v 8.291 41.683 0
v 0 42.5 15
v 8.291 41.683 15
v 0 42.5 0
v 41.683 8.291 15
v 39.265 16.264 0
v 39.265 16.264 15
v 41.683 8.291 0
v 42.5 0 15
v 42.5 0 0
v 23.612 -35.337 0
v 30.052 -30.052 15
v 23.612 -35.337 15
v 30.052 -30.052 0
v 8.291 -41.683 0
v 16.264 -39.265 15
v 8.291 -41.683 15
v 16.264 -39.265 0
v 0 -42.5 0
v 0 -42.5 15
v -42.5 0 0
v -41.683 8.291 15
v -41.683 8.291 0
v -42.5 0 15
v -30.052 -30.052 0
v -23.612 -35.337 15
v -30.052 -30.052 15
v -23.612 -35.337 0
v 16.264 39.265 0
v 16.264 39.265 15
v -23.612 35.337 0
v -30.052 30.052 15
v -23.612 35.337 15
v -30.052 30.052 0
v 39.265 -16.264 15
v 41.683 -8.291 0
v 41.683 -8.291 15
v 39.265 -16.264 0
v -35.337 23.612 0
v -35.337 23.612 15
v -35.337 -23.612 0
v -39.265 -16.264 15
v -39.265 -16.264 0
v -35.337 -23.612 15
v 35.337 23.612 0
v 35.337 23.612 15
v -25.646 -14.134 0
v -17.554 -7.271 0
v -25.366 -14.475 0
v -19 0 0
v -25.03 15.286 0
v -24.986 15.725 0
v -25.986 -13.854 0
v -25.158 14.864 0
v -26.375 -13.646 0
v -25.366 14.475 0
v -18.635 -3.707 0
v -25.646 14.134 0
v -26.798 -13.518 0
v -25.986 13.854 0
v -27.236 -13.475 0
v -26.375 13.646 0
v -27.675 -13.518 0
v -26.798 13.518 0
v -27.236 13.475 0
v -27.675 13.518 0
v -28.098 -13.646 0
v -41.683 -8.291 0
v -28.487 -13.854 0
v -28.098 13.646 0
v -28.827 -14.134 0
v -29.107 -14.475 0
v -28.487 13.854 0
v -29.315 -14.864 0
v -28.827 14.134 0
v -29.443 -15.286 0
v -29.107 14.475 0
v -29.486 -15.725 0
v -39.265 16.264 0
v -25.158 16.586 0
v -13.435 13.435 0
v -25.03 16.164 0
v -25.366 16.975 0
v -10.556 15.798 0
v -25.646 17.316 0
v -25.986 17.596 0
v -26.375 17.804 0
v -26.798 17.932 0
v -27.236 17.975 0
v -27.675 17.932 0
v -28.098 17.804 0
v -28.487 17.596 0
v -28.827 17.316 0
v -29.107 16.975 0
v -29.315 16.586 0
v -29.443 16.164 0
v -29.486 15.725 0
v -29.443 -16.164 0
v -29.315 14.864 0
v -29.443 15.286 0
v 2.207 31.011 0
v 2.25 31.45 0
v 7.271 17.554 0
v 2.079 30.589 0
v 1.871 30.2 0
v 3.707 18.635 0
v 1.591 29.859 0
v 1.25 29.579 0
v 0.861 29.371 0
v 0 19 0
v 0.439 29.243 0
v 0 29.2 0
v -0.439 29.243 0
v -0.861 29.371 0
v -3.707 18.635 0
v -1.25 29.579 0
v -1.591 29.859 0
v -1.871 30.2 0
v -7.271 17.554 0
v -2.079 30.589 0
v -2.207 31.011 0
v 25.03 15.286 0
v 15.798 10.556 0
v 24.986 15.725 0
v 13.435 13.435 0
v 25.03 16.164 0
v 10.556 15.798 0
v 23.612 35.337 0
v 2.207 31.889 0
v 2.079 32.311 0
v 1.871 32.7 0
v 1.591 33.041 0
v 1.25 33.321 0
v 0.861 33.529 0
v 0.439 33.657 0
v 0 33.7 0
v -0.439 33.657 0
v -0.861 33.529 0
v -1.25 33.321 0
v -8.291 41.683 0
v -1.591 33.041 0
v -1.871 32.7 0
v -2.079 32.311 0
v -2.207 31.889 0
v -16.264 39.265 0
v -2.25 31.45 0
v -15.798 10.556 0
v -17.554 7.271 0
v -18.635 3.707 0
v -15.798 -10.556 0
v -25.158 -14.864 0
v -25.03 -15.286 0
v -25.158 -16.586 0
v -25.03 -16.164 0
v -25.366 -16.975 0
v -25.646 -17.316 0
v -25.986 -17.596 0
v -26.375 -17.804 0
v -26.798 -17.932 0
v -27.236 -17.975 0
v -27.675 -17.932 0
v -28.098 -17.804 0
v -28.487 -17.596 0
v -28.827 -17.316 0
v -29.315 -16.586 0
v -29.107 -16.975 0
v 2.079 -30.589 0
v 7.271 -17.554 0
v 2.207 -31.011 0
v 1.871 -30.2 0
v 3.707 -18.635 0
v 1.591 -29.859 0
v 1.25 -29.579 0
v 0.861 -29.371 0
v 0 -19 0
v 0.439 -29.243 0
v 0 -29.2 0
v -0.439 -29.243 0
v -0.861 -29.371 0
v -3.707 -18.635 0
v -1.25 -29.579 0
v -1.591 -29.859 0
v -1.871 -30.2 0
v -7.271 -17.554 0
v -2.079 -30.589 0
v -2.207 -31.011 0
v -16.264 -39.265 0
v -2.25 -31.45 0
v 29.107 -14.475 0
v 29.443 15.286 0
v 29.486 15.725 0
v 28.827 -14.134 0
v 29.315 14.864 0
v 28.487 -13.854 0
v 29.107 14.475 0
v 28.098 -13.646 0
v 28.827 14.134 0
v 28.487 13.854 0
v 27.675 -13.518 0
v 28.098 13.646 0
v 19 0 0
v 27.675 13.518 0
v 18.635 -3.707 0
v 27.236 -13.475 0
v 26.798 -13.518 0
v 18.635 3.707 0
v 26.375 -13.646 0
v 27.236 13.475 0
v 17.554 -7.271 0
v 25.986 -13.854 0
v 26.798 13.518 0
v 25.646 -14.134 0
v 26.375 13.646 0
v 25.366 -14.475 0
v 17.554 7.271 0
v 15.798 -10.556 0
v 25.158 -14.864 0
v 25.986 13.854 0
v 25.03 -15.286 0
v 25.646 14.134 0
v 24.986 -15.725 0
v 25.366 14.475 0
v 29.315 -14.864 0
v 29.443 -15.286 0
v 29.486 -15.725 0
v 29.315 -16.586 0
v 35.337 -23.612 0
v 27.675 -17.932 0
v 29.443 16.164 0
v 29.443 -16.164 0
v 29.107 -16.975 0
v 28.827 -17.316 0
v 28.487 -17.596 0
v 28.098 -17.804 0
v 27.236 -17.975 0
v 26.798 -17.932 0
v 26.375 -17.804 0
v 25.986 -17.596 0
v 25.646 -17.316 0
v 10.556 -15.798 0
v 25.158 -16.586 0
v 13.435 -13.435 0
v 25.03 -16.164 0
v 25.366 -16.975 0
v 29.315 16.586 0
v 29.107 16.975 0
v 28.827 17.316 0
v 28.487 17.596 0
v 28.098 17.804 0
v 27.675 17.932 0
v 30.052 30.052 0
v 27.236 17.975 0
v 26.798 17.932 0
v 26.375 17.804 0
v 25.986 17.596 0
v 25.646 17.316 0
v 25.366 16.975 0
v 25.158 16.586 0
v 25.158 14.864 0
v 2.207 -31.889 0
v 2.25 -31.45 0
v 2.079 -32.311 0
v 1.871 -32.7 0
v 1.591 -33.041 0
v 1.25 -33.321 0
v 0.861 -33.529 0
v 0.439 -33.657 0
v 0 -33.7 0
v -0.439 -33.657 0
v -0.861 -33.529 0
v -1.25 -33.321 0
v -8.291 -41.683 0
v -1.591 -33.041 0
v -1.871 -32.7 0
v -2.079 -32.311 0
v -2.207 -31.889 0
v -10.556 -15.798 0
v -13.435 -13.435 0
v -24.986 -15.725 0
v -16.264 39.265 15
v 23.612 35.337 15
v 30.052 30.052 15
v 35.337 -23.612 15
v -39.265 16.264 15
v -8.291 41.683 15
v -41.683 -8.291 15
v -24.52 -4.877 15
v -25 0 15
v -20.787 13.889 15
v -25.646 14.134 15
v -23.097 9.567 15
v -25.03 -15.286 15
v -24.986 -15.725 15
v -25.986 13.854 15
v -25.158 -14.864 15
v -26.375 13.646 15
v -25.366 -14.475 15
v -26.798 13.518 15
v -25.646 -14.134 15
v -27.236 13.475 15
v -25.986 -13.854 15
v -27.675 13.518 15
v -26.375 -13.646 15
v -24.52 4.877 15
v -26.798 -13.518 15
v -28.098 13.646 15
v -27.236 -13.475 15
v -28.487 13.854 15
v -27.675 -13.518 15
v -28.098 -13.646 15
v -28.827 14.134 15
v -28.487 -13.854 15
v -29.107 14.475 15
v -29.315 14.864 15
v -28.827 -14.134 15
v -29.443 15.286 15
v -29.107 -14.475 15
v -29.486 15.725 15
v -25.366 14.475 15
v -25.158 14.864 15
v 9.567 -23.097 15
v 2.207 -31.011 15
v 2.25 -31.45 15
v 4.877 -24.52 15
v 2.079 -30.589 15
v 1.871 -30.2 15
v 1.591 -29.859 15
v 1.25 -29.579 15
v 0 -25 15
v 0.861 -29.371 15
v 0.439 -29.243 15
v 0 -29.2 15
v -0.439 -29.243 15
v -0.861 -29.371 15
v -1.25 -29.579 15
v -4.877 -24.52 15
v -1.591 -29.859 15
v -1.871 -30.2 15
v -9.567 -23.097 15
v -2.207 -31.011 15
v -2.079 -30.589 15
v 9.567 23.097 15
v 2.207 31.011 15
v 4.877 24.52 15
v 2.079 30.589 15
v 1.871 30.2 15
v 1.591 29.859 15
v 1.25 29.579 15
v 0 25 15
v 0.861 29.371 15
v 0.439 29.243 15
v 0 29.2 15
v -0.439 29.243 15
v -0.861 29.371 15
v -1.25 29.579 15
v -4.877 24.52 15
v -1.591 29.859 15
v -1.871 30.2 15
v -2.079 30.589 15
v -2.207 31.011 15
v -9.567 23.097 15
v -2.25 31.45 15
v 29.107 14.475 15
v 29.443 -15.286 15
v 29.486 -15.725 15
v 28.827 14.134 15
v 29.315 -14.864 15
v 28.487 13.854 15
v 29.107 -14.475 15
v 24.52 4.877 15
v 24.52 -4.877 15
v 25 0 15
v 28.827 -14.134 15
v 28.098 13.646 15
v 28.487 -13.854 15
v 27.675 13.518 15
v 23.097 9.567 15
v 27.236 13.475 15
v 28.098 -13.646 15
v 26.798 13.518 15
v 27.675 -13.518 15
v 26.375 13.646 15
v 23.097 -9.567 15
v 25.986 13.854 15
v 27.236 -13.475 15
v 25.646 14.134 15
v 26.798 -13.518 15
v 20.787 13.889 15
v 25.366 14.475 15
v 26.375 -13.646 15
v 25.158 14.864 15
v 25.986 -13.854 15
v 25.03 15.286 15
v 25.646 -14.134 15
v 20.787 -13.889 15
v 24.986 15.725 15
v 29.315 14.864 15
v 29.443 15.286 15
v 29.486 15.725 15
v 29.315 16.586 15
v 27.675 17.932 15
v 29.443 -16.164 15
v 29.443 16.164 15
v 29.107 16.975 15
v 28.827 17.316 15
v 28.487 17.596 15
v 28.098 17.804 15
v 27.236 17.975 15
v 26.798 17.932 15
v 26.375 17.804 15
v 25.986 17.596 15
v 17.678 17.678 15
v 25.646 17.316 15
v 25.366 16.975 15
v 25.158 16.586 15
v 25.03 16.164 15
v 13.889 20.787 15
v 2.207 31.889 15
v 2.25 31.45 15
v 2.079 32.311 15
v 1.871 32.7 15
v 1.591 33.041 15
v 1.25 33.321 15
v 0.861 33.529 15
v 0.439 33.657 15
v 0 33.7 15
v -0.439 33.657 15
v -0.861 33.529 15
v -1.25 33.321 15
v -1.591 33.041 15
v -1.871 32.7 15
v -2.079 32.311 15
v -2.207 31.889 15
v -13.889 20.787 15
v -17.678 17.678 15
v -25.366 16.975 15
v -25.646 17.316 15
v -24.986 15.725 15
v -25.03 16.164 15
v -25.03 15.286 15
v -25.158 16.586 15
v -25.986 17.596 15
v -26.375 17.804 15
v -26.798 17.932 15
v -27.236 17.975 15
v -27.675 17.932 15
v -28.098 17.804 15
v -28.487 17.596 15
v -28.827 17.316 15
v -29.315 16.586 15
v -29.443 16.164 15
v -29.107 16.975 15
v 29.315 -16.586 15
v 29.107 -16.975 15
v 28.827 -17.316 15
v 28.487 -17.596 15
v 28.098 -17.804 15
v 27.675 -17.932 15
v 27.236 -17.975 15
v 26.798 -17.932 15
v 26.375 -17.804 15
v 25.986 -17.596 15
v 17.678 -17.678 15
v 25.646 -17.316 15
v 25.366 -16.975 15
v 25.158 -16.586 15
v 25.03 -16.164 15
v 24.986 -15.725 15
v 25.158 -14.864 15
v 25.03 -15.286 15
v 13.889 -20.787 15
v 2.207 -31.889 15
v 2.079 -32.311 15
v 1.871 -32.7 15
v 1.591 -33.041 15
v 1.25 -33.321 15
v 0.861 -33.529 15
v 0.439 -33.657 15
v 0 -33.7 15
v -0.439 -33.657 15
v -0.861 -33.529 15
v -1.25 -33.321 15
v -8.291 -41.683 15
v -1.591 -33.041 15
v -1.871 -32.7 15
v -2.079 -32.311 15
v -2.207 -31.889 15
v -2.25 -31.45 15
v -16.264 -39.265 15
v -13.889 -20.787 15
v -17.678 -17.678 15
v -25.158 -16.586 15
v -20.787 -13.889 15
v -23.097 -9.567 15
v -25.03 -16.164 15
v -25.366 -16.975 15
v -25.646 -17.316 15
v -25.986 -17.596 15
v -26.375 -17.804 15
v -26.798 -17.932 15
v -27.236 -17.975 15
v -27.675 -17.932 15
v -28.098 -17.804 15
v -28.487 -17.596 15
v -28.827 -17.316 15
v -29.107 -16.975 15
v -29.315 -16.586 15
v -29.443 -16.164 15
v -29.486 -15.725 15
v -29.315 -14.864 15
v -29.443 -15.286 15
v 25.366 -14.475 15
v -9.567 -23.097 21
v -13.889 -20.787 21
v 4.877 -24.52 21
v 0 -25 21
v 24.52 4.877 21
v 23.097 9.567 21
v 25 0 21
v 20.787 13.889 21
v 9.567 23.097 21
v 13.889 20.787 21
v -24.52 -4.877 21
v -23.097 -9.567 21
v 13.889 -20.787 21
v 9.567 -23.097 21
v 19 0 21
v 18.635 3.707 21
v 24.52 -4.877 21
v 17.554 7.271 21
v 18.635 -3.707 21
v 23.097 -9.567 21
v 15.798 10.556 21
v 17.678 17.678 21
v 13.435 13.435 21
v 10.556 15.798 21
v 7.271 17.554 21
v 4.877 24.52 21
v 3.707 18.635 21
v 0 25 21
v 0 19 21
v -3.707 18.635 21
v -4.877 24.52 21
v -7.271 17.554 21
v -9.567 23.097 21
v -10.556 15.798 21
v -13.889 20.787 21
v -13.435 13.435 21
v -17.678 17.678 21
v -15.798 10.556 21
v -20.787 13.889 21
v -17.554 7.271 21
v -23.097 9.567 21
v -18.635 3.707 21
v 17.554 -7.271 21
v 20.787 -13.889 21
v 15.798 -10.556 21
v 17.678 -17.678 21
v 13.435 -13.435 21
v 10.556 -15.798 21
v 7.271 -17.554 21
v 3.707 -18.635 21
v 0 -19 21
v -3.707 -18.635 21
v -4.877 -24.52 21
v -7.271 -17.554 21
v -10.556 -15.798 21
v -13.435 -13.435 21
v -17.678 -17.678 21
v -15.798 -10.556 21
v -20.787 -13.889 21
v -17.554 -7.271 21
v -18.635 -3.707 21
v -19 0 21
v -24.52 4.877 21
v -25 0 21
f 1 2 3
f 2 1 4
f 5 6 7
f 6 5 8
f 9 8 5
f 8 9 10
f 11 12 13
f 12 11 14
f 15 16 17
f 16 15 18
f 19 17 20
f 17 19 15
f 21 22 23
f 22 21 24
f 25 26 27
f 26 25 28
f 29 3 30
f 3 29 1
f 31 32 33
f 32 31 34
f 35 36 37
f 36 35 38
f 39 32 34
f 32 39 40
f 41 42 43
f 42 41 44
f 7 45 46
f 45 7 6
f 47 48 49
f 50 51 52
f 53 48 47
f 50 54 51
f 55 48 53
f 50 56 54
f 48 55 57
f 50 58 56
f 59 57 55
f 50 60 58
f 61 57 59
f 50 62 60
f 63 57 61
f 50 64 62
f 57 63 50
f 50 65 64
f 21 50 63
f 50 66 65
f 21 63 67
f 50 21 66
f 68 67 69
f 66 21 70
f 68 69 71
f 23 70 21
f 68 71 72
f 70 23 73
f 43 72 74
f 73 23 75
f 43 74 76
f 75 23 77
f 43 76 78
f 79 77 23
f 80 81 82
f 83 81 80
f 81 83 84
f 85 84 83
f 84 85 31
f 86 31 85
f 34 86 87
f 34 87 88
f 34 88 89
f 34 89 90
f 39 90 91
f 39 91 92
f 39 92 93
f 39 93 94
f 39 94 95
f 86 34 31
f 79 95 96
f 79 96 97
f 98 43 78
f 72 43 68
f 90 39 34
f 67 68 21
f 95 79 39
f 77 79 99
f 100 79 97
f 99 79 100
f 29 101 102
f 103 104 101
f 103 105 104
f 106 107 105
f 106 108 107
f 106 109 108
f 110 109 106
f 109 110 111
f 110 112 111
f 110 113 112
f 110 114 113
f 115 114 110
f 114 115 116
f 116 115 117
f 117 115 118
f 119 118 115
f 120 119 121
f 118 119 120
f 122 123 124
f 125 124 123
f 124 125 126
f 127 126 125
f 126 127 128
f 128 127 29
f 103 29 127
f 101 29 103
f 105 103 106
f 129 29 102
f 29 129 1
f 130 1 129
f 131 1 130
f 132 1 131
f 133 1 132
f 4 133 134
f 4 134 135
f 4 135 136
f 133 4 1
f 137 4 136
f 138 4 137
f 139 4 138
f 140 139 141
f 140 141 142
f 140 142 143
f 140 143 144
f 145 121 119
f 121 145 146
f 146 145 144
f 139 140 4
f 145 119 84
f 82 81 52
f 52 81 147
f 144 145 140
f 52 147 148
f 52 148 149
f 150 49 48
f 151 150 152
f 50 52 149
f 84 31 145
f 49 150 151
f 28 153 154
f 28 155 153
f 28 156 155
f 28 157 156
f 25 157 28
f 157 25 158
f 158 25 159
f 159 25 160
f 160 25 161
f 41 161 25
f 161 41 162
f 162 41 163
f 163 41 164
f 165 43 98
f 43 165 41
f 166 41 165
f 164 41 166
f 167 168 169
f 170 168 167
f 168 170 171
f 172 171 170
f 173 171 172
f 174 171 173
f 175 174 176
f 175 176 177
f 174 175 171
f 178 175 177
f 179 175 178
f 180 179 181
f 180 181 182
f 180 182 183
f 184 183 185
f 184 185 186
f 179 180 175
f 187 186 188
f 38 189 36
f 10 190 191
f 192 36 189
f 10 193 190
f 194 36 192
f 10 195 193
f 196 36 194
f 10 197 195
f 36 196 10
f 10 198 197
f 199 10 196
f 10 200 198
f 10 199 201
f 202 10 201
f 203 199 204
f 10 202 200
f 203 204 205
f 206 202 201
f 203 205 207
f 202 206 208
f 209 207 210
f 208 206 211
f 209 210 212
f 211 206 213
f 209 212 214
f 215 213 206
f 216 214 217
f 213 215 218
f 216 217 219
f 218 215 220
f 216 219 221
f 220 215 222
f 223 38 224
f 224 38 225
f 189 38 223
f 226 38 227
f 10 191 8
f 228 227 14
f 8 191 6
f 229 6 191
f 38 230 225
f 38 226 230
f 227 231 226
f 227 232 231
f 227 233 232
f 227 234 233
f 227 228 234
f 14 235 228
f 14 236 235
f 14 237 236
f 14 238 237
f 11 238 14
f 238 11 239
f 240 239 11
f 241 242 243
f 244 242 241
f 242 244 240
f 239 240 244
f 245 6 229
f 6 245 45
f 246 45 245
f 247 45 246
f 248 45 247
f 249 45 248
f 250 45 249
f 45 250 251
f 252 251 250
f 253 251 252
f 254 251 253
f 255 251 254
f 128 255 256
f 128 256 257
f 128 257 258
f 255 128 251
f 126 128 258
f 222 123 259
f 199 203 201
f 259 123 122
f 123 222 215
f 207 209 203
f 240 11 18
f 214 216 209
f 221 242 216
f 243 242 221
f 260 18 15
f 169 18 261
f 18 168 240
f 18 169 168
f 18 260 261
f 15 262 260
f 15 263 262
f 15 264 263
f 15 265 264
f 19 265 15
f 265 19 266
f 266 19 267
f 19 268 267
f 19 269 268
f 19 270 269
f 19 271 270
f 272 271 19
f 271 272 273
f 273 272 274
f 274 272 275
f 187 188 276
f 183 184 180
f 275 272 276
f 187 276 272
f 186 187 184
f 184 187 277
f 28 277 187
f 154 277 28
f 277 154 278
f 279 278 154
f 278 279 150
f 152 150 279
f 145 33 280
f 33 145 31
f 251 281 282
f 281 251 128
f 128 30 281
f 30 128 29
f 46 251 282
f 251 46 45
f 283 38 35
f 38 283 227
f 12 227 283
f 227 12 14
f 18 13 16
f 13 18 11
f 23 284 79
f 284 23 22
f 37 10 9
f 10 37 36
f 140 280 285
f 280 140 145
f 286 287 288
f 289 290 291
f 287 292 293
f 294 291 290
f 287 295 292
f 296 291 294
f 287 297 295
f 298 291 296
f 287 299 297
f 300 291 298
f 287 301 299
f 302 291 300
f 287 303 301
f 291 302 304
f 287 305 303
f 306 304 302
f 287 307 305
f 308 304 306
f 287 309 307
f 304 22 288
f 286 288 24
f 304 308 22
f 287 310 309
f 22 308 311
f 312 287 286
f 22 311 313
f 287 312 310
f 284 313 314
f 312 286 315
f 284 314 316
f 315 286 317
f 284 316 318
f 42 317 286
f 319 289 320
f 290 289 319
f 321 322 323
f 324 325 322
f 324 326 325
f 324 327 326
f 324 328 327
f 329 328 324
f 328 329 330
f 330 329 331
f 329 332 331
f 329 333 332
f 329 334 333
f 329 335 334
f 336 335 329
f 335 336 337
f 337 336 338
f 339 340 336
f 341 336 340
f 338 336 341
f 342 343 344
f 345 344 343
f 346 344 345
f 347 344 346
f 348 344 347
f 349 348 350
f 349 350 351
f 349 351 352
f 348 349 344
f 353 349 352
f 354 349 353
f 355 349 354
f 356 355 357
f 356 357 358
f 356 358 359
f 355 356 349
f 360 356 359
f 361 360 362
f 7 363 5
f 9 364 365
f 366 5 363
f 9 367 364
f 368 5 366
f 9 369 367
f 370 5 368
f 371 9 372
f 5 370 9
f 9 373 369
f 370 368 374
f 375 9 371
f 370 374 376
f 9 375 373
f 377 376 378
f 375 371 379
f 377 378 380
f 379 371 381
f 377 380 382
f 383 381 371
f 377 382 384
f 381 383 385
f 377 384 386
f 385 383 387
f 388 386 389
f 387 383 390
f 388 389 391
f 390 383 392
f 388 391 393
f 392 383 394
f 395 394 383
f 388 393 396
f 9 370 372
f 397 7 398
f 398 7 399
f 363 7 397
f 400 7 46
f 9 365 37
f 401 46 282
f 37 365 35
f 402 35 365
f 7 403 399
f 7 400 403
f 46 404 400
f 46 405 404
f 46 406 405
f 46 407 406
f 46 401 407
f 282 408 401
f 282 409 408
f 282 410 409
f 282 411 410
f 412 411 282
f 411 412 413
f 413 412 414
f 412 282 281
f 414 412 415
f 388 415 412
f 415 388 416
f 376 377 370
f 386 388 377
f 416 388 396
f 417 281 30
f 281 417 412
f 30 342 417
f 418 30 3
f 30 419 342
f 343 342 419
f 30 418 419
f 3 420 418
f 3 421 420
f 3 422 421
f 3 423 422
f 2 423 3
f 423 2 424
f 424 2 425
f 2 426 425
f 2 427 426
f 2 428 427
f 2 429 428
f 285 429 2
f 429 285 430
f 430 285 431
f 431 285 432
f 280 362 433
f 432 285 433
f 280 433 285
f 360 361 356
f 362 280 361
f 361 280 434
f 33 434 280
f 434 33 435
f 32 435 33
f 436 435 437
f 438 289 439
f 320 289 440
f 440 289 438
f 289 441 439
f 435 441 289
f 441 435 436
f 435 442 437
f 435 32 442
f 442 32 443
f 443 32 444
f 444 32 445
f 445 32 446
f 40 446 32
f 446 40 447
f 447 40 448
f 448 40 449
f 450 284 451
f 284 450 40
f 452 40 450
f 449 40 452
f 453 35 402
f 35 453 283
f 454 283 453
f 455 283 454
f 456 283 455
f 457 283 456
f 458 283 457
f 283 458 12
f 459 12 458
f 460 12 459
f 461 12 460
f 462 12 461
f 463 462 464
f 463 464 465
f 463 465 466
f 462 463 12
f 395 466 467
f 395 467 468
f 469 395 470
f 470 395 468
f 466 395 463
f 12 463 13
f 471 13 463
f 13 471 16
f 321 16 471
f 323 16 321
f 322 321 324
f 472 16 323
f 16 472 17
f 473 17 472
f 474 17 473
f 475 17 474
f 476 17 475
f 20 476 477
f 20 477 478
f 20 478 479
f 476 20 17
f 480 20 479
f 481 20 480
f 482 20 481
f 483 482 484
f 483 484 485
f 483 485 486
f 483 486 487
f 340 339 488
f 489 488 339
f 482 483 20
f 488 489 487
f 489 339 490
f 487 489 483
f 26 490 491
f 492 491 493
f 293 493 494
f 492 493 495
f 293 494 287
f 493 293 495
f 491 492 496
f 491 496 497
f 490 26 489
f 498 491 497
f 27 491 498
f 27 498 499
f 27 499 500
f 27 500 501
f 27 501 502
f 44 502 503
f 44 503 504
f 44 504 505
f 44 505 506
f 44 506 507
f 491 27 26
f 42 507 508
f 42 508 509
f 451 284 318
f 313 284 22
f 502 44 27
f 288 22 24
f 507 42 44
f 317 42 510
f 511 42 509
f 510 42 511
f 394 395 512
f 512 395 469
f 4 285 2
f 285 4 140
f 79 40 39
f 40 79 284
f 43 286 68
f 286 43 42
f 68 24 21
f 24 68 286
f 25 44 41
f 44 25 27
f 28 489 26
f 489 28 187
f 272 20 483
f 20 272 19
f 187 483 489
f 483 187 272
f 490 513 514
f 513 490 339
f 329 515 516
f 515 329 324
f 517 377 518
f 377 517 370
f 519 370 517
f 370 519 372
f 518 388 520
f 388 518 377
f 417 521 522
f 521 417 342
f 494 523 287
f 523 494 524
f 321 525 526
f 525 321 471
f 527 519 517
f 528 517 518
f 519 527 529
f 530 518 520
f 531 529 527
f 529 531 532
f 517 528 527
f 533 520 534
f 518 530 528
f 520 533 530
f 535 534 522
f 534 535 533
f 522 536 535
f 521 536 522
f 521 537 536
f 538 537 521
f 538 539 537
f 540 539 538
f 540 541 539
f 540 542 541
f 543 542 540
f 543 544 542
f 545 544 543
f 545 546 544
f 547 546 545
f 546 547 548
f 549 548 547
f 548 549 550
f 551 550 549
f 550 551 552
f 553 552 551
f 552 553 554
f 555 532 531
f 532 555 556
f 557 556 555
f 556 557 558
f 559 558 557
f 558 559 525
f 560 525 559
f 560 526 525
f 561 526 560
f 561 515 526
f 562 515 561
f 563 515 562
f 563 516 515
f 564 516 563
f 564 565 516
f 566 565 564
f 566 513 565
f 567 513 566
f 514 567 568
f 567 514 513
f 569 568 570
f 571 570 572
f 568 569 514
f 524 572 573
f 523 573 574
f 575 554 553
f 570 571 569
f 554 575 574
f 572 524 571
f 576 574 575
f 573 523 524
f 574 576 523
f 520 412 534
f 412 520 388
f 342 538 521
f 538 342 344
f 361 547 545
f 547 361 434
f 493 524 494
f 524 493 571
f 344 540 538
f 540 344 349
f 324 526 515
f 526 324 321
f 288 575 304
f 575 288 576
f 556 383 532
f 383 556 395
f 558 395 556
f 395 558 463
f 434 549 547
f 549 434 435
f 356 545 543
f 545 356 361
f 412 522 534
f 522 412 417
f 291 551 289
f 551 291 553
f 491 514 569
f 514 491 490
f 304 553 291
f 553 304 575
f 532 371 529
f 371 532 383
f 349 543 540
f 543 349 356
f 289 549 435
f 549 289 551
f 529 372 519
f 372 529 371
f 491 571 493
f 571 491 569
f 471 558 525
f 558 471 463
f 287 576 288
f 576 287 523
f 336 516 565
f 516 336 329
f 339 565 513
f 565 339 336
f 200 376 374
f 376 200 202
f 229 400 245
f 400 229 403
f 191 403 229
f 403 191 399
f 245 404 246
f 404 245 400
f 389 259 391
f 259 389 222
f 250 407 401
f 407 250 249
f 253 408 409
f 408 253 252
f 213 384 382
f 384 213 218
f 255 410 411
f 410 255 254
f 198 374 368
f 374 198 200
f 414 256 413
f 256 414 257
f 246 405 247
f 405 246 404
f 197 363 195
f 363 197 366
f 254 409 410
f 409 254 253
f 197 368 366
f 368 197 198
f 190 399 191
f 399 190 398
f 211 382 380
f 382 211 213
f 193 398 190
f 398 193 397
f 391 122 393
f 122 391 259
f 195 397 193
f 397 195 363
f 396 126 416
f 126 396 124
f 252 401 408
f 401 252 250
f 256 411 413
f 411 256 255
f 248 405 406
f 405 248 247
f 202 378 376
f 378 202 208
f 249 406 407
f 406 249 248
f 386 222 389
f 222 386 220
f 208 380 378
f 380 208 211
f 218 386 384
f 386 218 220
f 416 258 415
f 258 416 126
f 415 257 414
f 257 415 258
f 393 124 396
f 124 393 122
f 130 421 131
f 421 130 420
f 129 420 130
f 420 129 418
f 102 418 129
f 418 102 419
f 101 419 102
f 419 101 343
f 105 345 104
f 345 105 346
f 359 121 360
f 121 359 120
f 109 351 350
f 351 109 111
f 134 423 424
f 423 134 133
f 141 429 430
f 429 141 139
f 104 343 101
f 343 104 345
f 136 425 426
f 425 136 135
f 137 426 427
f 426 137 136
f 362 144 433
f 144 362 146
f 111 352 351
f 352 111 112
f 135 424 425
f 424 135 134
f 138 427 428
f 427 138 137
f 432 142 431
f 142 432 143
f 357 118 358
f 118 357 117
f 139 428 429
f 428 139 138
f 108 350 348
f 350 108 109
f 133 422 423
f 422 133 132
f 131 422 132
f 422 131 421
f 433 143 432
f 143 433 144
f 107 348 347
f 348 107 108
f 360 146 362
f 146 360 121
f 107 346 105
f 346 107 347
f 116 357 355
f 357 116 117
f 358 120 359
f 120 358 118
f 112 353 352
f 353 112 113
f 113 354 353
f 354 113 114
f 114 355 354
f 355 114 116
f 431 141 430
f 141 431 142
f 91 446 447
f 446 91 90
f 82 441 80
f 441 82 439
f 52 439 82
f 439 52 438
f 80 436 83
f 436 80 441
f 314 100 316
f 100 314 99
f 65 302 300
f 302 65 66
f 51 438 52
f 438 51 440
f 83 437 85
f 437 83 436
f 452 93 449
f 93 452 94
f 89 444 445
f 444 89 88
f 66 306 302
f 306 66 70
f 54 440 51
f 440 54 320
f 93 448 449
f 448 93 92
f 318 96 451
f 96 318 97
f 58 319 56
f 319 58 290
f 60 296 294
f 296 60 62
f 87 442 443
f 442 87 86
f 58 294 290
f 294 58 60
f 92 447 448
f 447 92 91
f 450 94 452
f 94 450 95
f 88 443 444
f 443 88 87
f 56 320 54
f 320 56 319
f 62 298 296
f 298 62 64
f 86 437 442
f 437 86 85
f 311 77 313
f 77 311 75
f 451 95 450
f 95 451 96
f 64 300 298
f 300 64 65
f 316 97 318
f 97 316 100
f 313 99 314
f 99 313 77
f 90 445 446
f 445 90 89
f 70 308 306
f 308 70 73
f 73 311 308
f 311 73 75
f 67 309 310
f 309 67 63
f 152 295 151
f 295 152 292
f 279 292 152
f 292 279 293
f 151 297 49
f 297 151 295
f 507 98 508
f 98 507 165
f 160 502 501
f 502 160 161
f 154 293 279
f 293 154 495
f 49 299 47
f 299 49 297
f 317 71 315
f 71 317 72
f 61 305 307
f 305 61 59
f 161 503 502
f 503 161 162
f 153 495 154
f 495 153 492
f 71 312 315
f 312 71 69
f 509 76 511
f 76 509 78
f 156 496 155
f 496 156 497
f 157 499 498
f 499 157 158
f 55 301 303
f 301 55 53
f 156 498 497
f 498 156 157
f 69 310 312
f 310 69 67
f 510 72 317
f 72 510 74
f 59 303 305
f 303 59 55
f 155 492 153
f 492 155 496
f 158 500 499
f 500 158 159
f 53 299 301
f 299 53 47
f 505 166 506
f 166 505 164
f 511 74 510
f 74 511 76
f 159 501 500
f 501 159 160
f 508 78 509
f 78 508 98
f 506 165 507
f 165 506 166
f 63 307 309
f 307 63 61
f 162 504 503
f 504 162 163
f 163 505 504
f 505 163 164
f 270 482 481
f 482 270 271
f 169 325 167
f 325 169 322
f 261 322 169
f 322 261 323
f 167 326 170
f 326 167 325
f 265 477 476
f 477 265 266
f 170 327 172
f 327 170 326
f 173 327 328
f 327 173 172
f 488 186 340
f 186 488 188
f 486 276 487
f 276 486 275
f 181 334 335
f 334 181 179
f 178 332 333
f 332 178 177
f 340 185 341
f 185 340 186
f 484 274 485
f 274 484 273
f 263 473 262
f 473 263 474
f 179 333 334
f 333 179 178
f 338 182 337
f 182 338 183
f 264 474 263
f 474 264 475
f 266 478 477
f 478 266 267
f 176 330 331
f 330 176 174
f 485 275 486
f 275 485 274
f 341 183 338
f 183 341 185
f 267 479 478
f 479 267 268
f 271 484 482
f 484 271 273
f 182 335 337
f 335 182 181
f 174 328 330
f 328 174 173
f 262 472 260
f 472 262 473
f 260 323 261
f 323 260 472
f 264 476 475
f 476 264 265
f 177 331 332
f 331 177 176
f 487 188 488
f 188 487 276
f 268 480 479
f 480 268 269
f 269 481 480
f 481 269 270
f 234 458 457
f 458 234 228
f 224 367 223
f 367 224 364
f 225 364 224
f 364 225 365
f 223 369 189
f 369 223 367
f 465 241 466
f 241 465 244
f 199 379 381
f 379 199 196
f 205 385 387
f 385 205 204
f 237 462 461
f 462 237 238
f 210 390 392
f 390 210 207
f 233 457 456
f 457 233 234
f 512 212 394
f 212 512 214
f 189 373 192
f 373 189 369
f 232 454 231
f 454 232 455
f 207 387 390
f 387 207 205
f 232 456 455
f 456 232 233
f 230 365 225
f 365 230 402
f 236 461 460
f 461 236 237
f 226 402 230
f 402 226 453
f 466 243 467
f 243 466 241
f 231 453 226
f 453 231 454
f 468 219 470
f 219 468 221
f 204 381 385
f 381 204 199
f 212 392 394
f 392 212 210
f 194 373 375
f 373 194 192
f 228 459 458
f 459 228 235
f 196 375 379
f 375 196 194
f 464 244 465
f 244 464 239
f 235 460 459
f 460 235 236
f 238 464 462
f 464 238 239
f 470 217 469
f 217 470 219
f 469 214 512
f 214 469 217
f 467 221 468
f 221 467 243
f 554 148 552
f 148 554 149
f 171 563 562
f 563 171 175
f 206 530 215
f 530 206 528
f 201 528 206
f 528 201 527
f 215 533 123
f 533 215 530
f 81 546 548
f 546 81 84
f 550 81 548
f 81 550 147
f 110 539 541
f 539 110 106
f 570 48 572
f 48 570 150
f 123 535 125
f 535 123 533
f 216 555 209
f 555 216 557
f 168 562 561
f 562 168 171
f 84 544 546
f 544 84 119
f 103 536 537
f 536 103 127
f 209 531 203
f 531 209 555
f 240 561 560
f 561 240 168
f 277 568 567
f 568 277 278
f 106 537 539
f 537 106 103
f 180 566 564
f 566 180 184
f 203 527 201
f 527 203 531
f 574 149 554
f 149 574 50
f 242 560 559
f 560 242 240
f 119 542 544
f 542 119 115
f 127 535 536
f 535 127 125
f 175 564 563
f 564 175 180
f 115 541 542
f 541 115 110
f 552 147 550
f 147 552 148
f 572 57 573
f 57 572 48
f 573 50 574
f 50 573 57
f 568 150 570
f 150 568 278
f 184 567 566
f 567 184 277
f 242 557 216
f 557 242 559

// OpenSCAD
$fn = 32;

// ----------------------------------------------------------------------
// Flange Ø85 x 15
// 6 holes on a Ø62.9 bolt circle, bolted joints
// ----------------------------------------------------------------------

// --- parameters (mm) ---
flange_d = 85;   // outside diameter of the flange
thickness = 15;  // flange thickness
holes = 6;       // number of bolt holes
pcd = 62.9;      // bolt circle diameter
start_deg = 30;  // angle of the first hole, from +X
hole_d = 4.5;    // bolt hole diameter
bore_d = 38;     // central through bore
hub_d = 50;      // hub outside diameter
hub_h = 6;       // hub height above the flange face (0 = no hub)

// --- derived feature positions (mm) ---
height = thickness + hub_h;  // = 21   overall height of the part
pcd_r = pcd / 2;             // = 31.45   bolt circle radius
hole_step = 360 / holes;     // = 60   angular pitch
feature_centers = [
  [pcd_r * cos(start_deg + 0 * hole_step), pcd_r * sin(start_deg + 0 * hole_step)],
  [pcd_r * cos(start_deg + 1 * hole_step), pcd_r * sin(start_deg + 1 * hole_step)],
  [pcd_r * cos(start_deg + 2 * hole_step), pcd_r * sin(start_deg + 2 * hole_step)],
  [pcd_r * cos(start_deg + 3 * hole_step), pcd_r * sin(start_deg + 3 * hole_step)],
  [pcd_r * cos(start_deg + 4 * hole_step), pcd_r * sin(start_deg + 4 * hole_step)],
  [pcd_r * cos(start_deg + 5 * hole_step), pcd_r * sin(start_deg + 5 * hole_step)]
];   // bolt hole centres on the pitch circle

// flange disc, every hole and the bore cut straight through
difference() {
  union() {
    cylinder(d = flange_d, h = thickness);
    cylinder(d = hub_d, h = height);  // hub, overlapped into the flange
  }
  translate([0, 0, -1]) cylinder(d = bore_d, h = height + 2);  // bore, through
  for (centre = feature_centers)
    translate([centre[0], centre[1], -1]) cylinder(d = hole_d, h = thickness + 2);
}
